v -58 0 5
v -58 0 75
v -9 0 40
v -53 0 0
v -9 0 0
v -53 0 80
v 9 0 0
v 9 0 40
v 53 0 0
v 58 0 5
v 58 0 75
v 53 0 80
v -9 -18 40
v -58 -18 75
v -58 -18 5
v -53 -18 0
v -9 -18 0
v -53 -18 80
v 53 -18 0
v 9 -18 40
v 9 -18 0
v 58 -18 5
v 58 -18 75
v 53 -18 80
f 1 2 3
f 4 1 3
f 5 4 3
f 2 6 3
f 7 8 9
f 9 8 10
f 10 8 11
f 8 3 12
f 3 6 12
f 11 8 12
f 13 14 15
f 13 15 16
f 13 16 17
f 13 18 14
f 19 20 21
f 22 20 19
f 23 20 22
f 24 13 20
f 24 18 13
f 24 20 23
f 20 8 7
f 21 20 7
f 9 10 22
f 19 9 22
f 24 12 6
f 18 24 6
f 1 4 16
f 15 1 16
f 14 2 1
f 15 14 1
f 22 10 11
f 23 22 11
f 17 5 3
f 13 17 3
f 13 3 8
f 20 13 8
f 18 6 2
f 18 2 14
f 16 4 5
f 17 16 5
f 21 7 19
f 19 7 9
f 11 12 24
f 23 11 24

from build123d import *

# Parameters (mm, degrees)
F1_DEPTH = 18
F2_SIZE  = 5


with BuildPart() as f1:
    # F0 (on Front) → F1 (new body)
    with BuildSketch(Plane.XZ):
        Polygon((-58, 80), (-58, 0), (-9, 0), (-9, 40), (9, 40), (9, 0), (58, 0), (58, 80), align=None)
    extrude(amount=F1_DEPTH)

    # F2
    f2_edges = [f1.edges().sort_by_distance(p)[0] for p in [
        (-58, -9, 80),
        (-58, -9, 0),
        (58, -9, 80),
        (58, -9, 0),
    ]]
    chamfer(f2_edges, length=F2_SIZE)


solid = f1.part
